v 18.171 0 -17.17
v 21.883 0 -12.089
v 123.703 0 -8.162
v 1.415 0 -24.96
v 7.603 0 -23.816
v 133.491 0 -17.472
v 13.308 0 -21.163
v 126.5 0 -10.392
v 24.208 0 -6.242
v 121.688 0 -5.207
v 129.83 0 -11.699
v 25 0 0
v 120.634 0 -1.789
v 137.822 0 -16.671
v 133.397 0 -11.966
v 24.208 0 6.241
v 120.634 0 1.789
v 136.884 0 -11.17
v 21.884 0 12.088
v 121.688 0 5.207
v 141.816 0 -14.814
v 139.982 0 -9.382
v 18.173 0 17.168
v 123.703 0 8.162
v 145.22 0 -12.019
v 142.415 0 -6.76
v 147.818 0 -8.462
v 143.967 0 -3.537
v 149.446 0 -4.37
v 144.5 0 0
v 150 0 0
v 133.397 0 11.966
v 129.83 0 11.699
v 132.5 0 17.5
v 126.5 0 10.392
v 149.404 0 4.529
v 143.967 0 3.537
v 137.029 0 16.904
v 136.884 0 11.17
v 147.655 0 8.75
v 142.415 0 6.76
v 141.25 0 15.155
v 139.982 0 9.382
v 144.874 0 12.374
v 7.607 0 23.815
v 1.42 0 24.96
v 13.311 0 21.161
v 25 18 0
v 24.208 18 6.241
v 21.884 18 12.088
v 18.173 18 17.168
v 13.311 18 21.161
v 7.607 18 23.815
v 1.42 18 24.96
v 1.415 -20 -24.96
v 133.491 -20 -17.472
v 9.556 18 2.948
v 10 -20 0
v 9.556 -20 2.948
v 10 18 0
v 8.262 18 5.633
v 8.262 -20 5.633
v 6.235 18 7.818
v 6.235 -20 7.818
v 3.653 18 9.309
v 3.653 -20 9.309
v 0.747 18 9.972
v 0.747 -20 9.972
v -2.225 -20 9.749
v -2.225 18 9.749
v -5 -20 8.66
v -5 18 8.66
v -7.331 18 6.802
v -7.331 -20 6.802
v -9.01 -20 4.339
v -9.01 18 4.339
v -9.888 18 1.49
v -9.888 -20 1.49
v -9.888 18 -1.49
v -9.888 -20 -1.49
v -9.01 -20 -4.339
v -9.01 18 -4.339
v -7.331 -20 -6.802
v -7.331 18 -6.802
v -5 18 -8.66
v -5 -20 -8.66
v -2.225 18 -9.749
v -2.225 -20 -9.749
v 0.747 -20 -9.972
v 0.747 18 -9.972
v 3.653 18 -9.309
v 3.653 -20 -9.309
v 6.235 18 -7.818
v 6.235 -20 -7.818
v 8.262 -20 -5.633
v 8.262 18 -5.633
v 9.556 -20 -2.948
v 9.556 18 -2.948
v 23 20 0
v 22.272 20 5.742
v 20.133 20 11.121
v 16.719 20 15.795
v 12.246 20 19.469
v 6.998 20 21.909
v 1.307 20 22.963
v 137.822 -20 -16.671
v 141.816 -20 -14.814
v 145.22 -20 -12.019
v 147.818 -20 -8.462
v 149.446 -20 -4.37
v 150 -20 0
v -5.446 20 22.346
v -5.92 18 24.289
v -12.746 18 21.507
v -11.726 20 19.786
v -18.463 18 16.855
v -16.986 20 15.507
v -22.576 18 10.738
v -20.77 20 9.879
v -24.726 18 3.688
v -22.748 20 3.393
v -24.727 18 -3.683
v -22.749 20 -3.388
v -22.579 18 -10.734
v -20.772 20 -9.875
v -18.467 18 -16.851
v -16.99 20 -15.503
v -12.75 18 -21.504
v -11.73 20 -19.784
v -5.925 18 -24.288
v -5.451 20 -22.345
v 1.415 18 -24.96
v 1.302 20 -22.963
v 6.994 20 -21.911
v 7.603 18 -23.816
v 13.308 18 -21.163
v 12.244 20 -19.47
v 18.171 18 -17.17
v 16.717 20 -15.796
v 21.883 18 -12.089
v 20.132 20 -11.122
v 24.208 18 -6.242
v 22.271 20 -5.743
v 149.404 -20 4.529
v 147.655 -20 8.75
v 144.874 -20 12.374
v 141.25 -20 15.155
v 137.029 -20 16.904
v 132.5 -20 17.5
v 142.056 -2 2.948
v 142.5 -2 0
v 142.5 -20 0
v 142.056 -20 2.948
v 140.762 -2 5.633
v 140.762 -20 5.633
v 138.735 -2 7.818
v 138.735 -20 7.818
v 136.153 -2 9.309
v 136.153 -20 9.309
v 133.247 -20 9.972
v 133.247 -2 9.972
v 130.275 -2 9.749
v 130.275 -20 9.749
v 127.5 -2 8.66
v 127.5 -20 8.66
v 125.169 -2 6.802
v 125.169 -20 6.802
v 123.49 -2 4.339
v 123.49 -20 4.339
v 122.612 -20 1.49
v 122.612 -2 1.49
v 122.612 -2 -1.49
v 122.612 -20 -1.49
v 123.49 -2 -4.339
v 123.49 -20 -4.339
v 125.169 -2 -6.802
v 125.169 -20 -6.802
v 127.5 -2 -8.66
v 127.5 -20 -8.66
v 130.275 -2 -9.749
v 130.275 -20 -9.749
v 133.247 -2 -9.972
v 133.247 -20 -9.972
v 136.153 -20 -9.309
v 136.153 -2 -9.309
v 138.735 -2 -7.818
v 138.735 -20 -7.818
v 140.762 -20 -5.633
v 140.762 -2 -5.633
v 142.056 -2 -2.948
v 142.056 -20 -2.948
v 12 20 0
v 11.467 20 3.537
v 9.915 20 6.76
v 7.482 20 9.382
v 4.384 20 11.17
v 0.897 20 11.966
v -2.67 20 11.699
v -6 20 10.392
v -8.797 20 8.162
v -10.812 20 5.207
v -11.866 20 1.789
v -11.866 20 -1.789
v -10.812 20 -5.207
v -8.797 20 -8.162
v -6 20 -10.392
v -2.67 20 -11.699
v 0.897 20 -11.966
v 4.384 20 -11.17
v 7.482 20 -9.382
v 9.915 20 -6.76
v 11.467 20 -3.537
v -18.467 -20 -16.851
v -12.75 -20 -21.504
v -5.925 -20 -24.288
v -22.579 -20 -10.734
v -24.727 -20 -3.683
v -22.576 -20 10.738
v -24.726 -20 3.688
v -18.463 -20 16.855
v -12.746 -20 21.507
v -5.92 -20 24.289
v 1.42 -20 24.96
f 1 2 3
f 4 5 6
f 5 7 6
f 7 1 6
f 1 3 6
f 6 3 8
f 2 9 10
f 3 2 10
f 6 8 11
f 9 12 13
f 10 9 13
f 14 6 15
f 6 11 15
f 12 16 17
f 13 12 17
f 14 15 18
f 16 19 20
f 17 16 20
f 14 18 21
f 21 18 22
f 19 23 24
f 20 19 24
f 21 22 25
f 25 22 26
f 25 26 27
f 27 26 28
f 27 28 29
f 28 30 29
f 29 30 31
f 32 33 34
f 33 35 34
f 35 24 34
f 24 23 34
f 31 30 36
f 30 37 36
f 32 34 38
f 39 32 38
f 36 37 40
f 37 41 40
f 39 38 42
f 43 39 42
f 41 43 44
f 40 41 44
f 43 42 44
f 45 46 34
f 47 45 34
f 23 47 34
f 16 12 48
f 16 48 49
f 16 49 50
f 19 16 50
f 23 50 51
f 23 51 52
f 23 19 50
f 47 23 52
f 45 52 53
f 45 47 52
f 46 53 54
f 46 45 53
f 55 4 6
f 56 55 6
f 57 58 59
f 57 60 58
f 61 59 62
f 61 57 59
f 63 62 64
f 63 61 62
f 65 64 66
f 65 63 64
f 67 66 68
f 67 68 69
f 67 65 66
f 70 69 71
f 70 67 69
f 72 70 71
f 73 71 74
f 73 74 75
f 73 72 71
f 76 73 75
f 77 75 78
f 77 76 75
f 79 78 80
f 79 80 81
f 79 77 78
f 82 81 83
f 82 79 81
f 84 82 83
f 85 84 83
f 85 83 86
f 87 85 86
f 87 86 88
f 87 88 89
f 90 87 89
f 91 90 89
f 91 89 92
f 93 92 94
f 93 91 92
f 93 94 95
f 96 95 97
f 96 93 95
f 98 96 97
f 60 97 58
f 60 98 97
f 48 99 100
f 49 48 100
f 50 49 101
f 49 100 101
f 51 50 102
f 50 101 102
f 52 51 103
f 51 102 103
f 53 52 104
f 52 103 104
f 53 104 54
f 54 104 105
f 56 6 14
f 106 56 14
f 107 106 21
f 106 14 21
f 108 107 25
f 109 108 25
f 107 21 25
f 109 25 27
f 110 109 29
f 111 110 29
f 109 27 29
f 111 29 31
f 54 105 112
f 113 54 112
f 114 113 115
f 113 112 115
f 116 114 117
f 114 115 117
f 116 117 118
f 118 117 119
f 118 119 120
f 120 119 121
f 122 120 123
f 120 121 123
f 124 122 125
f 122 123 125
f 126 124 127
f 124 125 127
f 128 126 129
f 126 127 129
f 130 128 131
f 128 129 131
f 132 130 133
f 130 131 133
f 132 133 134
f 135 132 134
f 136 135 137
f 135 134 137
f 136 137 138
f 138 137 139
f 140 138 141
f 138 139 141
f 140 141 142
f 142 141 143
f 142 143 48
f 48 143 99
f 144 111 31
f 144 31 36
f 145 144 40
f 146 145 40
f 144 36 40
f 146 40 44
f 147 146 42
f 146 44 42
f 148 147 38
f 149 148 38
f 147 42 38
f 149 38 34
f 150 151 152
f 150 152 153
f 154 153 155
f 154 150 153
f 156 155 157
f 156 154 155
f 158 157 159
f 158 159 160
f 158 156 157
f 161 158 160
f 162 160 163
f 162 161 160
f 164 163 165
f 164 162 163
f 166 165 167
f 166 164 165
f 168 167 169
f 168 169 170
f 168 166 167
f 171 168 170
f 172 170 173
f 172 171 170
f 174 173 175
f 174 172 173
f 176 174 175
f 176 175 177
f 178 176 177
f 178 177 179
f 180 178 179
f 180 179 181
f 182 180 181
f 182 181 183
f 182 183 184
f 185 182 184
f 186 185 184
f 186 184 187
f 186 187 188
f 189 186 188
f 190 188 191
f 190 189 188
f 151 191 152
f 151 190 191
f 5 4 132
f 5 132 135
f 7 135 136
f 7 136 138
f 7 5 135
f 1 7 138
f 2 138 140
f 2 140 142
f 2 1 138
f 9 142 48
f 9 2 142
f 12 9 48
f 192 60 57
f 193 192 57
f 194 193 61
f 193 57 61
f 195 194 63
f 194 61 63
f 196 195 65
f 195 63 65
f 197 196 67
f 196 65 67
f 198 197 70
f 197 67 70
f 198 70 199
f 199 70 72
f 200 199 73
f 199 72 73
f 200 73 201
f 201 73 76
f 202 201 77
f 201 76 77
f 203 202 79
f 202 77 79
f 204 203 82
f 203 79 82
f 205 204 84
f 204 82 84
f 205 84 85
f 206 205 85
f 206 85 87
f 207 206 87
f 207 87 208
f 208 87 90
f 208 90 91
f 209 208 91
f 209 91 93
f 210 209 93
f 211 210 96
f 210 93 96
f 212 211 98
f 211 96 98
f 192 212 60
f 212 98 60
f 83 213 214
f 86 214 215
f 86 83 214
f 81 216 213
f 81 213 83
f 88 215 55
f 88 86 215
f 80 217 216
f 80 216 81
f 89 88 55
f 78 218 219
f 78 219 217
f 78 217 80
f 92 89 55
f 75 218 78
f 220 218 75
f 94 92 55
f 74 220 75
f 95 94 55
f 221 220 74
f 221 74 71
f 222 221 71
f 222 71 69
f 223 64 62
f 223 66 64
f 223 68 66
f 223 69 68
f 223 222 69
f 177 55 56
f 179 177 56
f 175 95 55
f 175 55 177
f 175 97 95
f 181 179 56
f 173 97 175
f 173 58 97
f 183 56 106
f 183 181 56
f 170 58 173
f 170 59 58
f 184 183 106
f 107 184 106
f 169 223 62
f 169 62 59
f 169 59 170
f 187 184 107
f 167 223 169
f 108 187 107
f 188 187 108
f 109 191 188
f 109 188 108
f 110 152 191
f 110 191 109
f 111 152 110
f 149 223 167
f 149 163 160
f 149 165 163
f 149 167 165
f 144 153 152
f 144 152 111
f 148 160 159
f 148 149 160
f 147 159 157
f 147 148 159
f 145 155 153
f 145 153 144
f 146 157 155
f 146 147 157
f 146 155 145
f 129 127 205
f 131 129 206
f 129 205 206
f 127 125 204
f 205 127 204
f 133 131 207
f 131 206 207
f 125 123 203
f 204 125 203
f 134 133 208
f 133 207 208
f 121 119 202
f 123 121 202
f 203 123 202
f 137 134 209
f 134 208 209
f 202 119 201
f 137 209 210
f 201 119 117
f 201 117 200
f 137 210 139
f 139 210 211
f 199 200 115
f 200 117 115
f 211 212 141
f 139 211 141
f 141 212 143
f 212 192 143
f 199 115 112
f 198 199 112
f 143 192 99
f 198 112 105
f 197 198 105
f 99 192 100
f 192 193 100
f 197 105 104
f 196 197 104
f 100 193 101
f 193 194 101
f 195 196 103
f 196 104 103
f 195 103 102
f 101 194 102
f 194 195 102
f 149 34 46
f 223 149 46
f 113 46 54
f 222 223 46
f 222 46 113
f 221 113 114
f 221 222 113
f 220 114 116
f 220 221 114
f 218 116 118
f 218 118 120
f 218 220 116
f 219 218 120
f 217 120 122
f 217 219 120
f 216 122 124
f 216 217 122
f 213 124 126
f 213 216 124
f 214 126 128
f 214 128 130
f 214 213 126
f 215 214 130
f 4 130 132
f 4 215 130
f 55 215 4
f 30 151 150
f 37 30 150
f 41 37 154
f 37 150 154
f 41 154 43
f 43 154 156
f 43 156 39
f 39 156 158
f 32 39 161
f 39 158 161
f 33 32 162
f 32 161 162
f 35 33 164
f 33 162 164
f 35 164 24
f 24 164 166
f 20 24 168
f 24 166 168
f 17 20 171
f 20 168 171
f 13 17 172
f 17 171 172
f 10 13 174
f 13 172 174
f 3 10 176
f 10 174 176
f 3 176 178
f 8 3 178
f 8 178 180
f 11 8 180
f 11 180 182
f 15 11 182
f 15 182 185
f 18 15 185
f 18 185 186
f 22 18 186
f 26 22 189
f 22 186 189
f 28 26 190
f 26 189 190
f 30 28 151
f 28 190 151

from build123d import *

# Parameters (mm, degrees)
F0_R     = 10
F1_DEPTH = 20
F2_DEPTH = 20
F3_SIZE  = 2


with BuildPart() as f1:
    # F0 (on Front) → F1 (new body)
    with BuildSketch(Plane.XZ):
        with BuildLine():
            ThreePointArc((1.415094, -24.959918), (18.171095, -17.17007), (25, 0))
            ThreePointArc((25, 0), (18.172929, 17.168129), (1.420428, 24.959615))
            ThreePointArc((1.420428, 24.959615), (-25, 0.002671), (1.415094, -24.959918))
        make_face()
        Circle(F0_R, mode=Mode.SUBTRACT)
        with BuildLine():
            ThreePointArc((1.420428, 24.959615), (18.172929, 17.168129), (25, 0))
            ThreePointArc((25, 0), (18.171095, -17.17007), (1.415094, -24.959918))
            Line((1.415094, -24.959918), (133.490566, -17.471943))
            ThreePointArc((133.490566, -17.471943), (115.007016, -0.495482), (132.5, 17.5))
            Line((132.5, 17.5), (1.420428, 24.959615))
        make_face()
        with BuildLine():
            ThreePointArc((150, 0), (144.874369, 12.374369), (132.5, 17.5))
            ThreePointArc((132.5, 17.5), (115.007016, -0.495482), (133.490566, -17.471943))
            ThreePointArc((133.490566, -17.471943), (145.219766, -12.019049), (150, 0))
        make_face()
        with Locations((132.5, 0)):
            Circle(F0_R, mode=Mode.SUBTRACT)
    extrude(amount=F1_DEPTH)

    # F0 (on Front) → F2 (join)
    with BuildSketch(Plane.XZ):
        with BuildLine():
            ThreePointArc((1.415094, -24.959918), (18.171095, -17.17007), (25, 0))
            ThreePointArc((25, 0), (18.172929, 17.168129), (1.420428, 24.959615))
            ThreePointArc((1.420428, 24.959615), (-25, 0.002671), (1.415094, -24.959918))
        make_face()
        Circle(F0_R, mode=Mode.SUBTRACT)
    extrude(amount=-F2_DEPTH)

    # F3
    f3_edges = [f1.edges().sort_by_distance(p)[0] for p in [
        (-10, 20, 0),
        (-1.415094, 20, 24.959918),
        (122.5, 0, 0),
    ]]
    chamfer(f3_edges, length=F3_SIZE)


solid = f1.part
